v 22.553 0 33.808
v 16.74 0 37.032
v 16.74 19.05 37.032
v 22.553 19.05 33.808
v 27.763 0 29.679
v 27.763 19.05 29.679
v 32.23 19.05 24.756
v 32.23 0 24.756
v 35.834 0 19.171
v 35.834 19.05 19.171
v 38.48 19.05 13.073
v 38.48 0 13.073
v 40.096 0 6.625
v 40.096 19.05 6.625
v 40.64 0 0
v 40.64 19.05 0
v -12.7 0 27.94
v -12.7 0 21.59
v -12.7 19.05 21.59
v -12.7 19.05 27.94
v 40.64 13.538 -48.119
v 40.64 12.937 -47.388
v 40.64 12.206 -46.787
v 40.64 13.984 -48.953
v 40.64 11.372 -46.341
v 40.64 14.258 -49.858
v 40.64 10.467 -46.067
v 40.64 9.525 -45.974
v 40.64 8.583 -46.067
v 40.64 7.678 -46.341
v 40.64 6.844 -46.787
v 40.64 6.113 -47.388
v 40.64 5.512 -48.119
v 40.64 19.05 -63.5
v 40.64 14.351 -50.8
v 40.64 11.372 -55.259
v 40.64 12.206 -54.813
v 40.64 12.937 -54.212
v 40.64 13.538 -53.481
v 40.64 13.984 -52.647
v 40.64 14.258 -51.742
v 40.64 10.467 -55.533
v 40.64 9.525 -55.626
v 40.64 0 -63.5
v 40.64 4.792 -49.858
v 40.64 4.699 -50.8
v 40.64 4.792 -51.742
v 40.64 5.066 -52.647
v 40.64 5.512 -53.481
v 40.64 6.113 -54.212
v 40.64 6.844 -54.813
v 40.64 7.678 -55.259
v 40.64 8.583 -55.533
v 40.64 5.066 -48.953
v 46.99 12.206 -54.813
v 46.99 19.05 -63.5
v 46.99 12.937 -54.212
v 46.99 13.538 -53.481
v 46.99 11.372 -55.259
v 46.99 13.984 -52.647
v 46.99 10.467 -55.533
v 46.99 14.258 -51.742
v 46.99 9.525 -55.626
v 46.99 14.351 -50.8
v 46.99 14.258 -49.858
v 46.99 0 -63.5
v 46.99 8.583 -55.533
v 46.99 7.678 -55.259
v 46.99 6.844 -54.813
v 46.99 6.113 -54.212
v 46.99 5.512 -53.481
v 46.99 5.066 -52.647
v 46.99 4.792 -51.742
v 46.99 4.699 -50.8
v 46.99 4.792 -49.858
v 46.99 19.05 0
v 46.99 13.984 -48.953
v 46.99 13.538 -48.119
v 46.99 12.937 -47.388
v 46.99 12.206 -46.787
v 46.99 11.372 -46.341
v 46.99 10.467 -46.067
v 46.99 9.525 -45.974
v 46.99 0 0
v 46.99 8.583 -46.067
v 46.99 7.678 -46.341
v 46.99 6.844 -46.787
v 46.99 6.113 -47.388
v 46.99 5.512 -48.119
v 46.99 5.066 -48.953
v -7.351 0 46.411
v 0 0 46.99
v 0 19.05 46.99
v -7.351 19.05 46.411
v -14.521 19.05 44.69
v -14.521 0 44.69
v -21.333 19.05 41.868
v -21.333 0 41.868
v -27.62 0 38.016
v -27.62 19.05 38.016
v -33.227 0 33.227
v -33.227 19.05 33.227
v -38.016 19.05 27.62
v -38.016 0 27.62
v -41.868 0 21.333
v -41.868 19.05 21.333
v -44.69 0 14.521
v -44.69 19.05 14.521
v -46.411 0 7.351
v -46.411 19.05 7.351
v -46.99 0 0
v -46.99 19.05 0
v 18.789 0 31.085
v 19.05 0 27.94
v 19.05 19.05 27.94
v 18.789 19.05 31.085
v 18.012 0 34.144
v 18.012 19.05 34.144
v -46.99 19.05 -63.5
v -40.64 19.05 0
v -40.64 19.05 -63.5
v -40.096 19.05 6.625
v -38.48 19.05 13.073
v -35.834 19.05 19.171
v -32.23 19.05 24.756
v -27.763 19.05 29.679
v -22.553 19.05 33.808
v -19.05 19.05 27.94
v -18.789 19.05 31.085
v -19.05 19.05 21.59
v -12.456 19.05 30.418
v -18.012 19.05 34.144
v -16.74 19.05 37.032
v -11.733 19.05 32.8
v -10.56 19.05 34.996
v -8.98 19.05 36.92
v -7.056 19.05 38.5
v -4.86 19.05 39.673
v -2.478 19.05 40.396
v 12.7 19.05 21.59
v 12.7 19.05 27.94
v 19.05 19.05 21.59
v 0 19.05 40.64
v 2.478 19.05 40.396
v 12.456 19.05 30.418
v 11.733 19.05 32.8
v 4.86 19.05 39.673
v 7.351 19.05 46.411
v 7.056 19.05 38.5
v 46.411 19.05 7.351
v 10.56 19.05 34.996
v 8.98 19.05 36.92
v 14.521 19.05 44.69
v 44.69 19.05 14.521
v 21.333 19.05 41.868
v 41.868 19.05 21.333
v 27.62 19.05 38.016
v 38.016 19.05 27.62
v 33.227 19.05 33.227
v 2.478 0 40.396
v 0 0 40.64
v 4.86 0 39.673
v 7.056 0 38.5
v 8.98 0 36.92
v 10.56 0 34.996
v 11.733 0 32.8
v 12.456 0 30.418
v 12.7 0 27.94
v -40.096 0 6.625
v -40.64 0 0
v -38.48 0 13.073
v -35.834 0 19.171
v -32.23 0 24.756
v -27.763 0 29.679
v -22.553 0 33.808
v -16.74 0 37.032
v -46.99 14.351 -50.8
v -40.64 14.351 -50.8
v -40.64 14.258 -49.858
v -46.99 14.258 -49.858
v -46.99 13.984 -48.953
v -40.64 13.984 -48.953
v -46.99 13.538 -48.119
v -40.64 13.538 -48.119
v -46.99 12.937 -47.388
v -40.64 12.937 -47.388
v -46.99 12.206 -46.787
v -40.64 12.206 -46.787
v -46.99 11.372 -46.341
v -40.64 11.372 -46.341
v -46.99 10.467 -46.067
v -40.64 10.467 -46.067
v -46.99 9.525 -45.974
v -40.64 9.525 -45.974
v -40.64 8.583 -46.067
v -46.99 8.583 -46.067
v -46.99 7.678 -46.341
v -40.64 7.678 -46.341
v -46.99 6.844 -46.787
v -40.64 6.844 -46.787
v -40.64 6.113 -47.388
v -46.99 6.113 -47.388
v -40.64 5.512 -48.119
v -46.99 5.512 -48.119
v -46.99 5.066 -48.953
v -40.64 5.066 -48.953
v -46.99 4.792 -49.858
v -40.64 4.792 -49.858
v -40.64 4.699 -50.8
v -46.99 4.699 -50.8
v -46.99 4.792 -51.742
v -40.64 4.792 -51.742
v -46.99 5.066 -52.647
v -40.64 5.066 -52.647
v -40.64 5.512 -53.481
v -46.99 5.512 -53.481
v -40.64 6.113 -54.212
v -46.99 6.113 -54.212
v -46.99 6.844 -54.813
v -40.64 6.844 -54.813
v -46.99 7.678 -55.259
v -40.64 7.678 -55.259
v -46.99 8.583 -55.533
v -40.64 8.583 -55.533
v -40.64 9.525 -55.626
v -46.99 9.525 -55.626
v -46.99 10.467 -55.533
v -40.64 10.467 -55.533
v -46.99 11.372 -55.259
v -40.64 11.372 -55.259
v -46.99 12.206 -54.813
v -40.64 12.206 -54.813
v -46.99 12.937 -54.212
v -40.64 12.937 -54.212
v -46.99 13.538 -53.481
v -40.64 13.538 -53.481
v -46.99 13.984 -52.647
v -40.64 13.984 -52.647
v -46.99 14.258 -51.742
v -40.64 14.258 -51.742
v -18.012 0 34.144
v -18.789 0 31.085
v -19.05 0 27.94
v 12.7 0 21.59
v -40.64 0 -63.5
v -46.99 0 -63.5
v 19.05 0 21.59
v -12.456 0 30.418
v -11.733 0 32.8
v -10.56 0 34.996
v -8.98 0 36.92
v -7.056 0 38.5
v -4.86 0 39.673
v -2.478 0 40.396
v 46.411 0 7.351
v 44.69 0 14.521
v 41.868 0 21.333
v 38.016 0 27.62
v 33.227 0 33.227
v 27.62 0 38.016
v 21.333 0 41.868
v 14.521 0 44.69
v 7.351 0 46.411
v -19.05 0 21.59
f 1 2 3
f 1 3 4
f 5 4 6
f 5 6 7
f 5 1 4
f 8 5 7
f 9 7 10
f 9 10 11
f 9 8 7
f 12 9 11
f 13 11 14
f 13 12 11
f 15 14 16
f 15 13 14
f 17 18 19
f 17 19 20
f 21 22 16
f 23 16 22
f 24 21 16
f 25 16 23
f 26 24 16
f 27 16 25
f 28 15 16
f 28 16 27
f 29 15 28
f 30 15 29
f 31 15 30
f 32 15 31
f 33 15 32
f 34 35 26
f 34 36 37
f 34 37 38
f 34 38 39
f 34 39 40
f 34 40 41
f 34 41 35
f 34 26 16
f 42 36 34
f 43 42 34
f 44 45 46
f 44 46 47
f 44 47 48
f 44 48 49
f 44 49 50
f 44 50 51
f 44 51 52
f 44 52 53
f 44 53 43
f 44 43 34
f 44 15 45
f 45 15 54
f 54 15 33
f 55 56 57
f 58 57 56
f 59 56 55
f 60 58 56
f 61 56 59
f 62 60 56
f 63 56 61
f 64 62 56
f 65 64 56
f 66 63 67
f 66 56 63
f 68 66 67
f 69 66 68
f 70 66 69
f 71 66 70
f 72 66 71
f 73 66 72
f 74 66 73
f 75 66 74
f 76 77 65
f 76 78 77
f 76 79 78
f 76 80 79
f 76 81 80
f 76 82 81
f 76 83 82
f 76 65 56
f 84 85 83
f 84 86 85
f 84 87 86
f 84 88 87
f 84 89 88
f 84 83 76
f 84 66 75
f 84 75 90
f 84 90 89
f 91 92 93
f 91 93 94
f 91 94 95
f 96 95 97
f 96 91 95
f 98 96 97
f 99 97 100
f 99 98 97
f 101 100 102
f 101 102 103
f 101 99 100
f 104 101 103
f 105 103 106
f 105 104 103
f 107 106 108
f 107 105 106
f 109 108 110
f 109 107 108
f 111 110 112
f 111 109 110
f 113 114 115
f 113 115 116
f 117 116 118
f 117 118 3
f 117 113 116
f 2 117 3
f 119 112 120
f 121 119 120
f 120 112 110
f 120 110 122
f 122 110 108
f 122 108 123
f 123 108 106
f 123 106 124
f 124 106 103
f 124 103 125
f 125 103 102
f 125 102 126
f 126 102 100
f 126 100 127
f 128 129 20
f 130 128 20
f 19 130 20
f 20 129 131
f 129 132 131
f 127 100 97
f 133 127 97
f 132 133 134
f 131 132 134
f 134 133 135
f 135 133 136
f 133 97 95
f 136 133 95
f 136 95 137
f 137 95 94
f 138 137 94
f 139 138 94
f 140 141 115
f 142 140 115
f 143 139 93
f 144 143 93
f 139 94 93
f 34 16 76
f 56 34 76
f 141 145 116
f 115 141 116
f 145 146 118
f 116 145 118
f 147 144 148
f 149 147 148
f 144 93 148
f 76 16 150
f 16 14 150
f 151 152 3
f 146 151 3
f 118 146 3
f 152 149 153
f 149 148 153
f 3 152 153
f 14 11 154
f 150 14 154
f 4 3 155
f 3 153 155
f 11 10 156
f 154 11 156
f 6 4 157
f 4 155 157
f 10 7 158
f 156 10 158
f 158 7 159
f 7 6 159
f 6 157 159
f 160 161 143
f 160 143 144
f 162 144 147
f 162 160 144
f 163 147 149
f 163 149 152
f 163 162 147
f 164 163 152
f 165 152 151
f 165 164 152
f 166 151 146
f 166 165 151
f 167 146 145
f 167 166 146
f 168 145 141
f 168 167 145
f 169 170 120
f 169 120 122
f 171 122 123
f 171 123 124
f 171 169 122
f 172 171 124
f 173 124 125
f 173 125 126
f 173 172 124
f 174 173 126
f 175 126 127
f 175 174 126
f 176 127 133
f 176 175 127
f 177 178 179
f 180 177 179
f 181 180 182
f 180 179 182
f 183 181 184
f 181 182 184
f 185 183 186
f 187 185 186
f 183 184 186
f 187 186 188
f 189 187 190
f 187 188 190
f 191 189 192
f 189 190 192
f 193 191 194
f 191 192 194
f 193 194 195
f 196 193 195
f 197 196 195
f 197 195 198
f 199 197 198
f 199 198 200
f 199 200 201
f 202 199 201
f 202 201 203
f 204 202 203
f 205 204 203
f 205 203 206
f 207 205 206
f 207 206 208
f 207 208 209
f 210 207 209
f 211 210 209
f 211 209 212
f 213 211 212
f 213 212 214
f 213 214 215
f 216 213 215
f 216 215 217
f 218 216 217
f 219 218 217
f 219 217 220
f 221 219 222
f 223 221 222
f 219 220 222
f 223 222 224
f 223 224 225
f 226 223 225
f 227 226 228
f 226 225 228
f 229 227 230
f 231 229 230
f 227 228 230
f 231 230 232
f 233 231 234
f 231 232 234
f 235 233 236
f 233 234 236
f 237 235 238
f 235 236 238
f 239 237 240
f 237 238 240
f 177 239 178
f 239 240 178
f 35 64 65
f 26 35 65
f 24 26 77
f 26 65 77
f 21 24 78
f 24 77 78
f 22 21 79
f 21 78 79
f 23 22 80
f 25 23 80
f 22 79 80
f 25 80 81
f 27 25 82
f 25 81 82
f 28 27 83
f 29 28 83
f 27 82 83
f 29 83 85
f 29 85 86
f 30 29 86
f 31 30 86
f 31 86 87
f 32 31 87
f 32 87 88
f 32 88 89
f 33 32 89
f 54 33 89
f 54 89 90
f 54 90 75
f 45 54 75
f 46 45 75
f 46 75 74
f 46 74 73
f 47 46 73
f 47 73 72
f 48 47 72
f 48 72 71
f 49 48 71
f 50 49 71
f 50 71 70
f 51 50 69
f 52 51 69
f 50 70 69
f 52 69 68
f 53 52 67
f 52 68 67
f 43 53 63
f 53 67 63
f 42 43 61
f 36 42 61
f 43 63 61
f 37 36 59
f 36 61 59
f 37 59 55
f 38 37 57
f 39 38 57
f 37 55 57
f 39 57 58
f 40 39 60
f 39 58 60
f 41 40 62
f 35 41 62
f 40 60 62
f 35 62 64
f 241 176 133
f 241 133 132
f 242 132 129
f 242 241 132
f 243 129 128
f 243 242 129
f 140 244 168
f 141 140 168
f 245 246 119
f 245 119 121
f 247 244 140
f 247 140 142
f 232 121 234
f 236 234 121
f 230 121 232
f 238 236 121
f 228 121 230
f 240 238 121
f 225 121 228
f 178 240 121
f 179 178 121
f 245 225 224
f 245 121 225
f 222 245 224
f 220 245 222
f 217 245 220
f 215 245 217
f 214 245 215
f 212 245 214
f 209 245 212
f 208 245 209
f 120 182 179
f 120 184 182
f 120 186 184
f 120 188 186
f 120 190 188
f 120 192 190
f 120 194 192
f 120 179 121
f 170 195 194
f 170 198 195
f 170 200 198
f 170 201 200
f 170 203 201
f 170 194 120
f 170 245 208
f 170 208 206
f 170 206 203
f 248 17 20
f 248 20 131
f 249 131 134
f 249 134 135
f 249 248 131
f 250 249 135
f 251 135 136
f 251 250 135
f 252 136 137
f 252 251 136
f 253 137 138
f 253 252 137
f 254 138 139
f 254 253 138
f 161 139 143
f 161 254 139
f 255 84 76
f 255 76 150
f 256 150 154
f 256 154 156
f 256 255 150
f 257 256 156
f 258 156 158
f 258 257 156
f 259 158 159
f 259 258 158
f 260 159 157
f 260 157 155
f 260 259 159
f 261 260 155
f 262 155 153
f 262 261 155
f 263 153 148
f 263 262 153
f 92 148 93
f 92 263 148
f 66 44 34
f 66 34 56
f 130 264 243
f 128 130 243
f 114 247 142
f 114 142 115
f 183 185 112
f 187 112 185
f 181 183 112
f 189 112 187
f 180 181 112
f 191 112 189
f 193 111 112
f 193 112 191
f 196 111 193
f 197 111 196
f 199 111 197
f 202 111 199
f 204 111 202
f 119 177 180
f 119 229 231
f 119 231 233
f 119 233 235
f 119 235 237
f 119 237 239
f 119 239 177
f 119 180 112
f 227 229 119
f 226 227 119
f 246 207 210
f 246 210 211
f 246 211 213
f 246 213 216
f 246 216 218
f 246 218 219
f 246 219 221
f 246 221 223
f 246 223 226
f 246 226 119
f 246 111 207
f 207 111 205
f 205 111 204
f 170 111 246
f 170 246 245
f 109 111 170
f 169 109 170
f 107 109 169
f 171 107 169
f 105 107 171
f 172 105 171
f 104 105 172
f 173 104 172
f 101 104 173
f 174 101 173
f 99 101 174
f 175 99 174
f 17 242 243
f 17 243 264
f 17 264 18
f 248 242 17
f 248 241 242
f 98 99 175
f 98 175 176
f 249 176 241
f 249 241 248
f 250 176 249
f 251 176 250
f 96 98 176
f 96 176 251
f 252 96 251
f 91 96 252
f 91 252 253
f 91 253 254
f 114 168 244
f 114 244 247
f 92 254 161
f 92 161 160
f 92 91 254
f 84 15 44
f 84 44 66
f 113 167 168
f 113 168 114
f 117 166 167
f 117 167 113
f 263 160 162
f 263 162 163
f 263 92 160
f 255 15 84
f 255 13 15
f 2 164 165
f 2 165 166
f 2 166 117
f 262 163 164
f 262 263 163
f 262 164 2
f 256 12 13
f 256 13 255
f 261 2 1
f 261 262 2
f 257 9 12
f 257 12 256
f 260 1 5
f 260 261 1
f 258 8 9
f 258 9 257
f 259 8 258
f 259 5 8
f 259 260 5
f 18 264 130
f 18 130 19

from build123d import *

# Parameters (mm, degrees)
F0_W     = 6.35
F0_H     = 6.35
F1_DEPTH = 19.05
F2_R     = 4.826
F3_DEPTH = 93.9810005078


# Not quite as in the source:
# - ends of sketch curves that miss each other by under 0.0002 mm in the source are joined


with BuildPart() as f1:
    # F0 (on Front) → F1 (new body)
    with BuildSketch(Plane.XZ):
        with BuildLine():
            Line((-40.64, -63.5), (-40.64, 0))
            ThreePointArc((-40.64, 0), (-34.1462652747, 22.0372903913), (-16.7402870182, 37.0320454545))
            ThreePointArc((-16.7402870182, 37.0320454545), (-9.7390716727, 44.3123236883), (0, 46.99))
            ThreePointArc((0, 46.99), (-33.2269478275, 33.2269478275), (-46.9900002539, 0))
            Line((-46.9900002539, 0), (-46.9900002539, -63.5))
            Line((-46.9900002539, -63.5), (-40.64, -63.5))
        make_face()
        with BuildLine():
            ThreePointArc((0, 46.99), (-9.7390716727, 44.3123236883), (-16.7402870182, 37.0320454545))
            ThreePointArc((-16.7402870182, 37.0320454545), (-8.5623382423, 39.727773205), (2.25e-08, 40.64))
            ThreePointArc((2.25e-08, 40.64), (8.5623382643, 39.7277732002), (16.7402870182, 37.0320454545))
            ThreePointArc((16.7402870182, 37.0320454545), (9.7390716727, 44.3123236883), (0, 46.99))
        make_face()
        with BuildLine():
            ThreePointArc((16.7402870182, 37.0320454545), (34.1462652747, 22.0372903913), (40.64, 0))
            Line((40.64, 0), (40.64, -63.5))
            Line((40.64, -63.5), (46.9900002539, -63.5))
            Line((46.9900002539, -63.5), (46.9900002539, 0))
            ThreePointArc((46.9900002539, 0), (33.2269478275, 33.2269478275), (0, 46.9900002539))
            ThreePointArc((0, 46.9900002539), (9.7390716727, 44.3123236883), (16.7402870182, 37.0320454545))
        make_face()
        with BuildLine():
            ThreePointArc((19.05, 27.94), (18.463544726, 32.6304174816), (16.7402870182, 37.0320454545))
            ThreePointArc((16.7402870182, 37.0320454545), (8.5623382643, 39.7277732002), (2.25e-08, 40.64))
            ThreePointArc((2.25e-08, 40.64), (8.980256129, 36.9202561131), (12.7, 27.94))
            Line((12.7, 27.94), (19.05, 27.94))
        make_face()
        with BuildLine():
            ThreePointArc((2.25e-08, 40.64), (-8.5623382423, 39.727773205), (-16.7402870182, 37.0320454545))
            ThreePointArc((-16.7402870182, 37.0320454545), (-18.463544726, 32.6304174816), (-19.05, 27.94))
            Line((-19.05, 27.94), (-12.7, 27.94))
            ThreePointArc((-12.7, 27.94), (-8.9802561131, 36.920256129), (2.25e-08, 40.64))
        make_face()
        with Locations((15.875, 24.765)):
            Rectangle(F0_W, F0_H)
        with Locations((-15.875, 24.765)):
            Rectangle(F0_W, F0_H)
    extrude(amount=-F1_DEPTH)

    # F2 (on face) → F3 (cut, through all)
    with BuildSketch(Plane.YZ.offset(46.9900002539)):
        with Locations((9.525, -50.8)):
            Circle(F2_R)
    extrude(amount=-F3_DEPTH, mode=Mode.SUBTRACT)


solid = f1.part
